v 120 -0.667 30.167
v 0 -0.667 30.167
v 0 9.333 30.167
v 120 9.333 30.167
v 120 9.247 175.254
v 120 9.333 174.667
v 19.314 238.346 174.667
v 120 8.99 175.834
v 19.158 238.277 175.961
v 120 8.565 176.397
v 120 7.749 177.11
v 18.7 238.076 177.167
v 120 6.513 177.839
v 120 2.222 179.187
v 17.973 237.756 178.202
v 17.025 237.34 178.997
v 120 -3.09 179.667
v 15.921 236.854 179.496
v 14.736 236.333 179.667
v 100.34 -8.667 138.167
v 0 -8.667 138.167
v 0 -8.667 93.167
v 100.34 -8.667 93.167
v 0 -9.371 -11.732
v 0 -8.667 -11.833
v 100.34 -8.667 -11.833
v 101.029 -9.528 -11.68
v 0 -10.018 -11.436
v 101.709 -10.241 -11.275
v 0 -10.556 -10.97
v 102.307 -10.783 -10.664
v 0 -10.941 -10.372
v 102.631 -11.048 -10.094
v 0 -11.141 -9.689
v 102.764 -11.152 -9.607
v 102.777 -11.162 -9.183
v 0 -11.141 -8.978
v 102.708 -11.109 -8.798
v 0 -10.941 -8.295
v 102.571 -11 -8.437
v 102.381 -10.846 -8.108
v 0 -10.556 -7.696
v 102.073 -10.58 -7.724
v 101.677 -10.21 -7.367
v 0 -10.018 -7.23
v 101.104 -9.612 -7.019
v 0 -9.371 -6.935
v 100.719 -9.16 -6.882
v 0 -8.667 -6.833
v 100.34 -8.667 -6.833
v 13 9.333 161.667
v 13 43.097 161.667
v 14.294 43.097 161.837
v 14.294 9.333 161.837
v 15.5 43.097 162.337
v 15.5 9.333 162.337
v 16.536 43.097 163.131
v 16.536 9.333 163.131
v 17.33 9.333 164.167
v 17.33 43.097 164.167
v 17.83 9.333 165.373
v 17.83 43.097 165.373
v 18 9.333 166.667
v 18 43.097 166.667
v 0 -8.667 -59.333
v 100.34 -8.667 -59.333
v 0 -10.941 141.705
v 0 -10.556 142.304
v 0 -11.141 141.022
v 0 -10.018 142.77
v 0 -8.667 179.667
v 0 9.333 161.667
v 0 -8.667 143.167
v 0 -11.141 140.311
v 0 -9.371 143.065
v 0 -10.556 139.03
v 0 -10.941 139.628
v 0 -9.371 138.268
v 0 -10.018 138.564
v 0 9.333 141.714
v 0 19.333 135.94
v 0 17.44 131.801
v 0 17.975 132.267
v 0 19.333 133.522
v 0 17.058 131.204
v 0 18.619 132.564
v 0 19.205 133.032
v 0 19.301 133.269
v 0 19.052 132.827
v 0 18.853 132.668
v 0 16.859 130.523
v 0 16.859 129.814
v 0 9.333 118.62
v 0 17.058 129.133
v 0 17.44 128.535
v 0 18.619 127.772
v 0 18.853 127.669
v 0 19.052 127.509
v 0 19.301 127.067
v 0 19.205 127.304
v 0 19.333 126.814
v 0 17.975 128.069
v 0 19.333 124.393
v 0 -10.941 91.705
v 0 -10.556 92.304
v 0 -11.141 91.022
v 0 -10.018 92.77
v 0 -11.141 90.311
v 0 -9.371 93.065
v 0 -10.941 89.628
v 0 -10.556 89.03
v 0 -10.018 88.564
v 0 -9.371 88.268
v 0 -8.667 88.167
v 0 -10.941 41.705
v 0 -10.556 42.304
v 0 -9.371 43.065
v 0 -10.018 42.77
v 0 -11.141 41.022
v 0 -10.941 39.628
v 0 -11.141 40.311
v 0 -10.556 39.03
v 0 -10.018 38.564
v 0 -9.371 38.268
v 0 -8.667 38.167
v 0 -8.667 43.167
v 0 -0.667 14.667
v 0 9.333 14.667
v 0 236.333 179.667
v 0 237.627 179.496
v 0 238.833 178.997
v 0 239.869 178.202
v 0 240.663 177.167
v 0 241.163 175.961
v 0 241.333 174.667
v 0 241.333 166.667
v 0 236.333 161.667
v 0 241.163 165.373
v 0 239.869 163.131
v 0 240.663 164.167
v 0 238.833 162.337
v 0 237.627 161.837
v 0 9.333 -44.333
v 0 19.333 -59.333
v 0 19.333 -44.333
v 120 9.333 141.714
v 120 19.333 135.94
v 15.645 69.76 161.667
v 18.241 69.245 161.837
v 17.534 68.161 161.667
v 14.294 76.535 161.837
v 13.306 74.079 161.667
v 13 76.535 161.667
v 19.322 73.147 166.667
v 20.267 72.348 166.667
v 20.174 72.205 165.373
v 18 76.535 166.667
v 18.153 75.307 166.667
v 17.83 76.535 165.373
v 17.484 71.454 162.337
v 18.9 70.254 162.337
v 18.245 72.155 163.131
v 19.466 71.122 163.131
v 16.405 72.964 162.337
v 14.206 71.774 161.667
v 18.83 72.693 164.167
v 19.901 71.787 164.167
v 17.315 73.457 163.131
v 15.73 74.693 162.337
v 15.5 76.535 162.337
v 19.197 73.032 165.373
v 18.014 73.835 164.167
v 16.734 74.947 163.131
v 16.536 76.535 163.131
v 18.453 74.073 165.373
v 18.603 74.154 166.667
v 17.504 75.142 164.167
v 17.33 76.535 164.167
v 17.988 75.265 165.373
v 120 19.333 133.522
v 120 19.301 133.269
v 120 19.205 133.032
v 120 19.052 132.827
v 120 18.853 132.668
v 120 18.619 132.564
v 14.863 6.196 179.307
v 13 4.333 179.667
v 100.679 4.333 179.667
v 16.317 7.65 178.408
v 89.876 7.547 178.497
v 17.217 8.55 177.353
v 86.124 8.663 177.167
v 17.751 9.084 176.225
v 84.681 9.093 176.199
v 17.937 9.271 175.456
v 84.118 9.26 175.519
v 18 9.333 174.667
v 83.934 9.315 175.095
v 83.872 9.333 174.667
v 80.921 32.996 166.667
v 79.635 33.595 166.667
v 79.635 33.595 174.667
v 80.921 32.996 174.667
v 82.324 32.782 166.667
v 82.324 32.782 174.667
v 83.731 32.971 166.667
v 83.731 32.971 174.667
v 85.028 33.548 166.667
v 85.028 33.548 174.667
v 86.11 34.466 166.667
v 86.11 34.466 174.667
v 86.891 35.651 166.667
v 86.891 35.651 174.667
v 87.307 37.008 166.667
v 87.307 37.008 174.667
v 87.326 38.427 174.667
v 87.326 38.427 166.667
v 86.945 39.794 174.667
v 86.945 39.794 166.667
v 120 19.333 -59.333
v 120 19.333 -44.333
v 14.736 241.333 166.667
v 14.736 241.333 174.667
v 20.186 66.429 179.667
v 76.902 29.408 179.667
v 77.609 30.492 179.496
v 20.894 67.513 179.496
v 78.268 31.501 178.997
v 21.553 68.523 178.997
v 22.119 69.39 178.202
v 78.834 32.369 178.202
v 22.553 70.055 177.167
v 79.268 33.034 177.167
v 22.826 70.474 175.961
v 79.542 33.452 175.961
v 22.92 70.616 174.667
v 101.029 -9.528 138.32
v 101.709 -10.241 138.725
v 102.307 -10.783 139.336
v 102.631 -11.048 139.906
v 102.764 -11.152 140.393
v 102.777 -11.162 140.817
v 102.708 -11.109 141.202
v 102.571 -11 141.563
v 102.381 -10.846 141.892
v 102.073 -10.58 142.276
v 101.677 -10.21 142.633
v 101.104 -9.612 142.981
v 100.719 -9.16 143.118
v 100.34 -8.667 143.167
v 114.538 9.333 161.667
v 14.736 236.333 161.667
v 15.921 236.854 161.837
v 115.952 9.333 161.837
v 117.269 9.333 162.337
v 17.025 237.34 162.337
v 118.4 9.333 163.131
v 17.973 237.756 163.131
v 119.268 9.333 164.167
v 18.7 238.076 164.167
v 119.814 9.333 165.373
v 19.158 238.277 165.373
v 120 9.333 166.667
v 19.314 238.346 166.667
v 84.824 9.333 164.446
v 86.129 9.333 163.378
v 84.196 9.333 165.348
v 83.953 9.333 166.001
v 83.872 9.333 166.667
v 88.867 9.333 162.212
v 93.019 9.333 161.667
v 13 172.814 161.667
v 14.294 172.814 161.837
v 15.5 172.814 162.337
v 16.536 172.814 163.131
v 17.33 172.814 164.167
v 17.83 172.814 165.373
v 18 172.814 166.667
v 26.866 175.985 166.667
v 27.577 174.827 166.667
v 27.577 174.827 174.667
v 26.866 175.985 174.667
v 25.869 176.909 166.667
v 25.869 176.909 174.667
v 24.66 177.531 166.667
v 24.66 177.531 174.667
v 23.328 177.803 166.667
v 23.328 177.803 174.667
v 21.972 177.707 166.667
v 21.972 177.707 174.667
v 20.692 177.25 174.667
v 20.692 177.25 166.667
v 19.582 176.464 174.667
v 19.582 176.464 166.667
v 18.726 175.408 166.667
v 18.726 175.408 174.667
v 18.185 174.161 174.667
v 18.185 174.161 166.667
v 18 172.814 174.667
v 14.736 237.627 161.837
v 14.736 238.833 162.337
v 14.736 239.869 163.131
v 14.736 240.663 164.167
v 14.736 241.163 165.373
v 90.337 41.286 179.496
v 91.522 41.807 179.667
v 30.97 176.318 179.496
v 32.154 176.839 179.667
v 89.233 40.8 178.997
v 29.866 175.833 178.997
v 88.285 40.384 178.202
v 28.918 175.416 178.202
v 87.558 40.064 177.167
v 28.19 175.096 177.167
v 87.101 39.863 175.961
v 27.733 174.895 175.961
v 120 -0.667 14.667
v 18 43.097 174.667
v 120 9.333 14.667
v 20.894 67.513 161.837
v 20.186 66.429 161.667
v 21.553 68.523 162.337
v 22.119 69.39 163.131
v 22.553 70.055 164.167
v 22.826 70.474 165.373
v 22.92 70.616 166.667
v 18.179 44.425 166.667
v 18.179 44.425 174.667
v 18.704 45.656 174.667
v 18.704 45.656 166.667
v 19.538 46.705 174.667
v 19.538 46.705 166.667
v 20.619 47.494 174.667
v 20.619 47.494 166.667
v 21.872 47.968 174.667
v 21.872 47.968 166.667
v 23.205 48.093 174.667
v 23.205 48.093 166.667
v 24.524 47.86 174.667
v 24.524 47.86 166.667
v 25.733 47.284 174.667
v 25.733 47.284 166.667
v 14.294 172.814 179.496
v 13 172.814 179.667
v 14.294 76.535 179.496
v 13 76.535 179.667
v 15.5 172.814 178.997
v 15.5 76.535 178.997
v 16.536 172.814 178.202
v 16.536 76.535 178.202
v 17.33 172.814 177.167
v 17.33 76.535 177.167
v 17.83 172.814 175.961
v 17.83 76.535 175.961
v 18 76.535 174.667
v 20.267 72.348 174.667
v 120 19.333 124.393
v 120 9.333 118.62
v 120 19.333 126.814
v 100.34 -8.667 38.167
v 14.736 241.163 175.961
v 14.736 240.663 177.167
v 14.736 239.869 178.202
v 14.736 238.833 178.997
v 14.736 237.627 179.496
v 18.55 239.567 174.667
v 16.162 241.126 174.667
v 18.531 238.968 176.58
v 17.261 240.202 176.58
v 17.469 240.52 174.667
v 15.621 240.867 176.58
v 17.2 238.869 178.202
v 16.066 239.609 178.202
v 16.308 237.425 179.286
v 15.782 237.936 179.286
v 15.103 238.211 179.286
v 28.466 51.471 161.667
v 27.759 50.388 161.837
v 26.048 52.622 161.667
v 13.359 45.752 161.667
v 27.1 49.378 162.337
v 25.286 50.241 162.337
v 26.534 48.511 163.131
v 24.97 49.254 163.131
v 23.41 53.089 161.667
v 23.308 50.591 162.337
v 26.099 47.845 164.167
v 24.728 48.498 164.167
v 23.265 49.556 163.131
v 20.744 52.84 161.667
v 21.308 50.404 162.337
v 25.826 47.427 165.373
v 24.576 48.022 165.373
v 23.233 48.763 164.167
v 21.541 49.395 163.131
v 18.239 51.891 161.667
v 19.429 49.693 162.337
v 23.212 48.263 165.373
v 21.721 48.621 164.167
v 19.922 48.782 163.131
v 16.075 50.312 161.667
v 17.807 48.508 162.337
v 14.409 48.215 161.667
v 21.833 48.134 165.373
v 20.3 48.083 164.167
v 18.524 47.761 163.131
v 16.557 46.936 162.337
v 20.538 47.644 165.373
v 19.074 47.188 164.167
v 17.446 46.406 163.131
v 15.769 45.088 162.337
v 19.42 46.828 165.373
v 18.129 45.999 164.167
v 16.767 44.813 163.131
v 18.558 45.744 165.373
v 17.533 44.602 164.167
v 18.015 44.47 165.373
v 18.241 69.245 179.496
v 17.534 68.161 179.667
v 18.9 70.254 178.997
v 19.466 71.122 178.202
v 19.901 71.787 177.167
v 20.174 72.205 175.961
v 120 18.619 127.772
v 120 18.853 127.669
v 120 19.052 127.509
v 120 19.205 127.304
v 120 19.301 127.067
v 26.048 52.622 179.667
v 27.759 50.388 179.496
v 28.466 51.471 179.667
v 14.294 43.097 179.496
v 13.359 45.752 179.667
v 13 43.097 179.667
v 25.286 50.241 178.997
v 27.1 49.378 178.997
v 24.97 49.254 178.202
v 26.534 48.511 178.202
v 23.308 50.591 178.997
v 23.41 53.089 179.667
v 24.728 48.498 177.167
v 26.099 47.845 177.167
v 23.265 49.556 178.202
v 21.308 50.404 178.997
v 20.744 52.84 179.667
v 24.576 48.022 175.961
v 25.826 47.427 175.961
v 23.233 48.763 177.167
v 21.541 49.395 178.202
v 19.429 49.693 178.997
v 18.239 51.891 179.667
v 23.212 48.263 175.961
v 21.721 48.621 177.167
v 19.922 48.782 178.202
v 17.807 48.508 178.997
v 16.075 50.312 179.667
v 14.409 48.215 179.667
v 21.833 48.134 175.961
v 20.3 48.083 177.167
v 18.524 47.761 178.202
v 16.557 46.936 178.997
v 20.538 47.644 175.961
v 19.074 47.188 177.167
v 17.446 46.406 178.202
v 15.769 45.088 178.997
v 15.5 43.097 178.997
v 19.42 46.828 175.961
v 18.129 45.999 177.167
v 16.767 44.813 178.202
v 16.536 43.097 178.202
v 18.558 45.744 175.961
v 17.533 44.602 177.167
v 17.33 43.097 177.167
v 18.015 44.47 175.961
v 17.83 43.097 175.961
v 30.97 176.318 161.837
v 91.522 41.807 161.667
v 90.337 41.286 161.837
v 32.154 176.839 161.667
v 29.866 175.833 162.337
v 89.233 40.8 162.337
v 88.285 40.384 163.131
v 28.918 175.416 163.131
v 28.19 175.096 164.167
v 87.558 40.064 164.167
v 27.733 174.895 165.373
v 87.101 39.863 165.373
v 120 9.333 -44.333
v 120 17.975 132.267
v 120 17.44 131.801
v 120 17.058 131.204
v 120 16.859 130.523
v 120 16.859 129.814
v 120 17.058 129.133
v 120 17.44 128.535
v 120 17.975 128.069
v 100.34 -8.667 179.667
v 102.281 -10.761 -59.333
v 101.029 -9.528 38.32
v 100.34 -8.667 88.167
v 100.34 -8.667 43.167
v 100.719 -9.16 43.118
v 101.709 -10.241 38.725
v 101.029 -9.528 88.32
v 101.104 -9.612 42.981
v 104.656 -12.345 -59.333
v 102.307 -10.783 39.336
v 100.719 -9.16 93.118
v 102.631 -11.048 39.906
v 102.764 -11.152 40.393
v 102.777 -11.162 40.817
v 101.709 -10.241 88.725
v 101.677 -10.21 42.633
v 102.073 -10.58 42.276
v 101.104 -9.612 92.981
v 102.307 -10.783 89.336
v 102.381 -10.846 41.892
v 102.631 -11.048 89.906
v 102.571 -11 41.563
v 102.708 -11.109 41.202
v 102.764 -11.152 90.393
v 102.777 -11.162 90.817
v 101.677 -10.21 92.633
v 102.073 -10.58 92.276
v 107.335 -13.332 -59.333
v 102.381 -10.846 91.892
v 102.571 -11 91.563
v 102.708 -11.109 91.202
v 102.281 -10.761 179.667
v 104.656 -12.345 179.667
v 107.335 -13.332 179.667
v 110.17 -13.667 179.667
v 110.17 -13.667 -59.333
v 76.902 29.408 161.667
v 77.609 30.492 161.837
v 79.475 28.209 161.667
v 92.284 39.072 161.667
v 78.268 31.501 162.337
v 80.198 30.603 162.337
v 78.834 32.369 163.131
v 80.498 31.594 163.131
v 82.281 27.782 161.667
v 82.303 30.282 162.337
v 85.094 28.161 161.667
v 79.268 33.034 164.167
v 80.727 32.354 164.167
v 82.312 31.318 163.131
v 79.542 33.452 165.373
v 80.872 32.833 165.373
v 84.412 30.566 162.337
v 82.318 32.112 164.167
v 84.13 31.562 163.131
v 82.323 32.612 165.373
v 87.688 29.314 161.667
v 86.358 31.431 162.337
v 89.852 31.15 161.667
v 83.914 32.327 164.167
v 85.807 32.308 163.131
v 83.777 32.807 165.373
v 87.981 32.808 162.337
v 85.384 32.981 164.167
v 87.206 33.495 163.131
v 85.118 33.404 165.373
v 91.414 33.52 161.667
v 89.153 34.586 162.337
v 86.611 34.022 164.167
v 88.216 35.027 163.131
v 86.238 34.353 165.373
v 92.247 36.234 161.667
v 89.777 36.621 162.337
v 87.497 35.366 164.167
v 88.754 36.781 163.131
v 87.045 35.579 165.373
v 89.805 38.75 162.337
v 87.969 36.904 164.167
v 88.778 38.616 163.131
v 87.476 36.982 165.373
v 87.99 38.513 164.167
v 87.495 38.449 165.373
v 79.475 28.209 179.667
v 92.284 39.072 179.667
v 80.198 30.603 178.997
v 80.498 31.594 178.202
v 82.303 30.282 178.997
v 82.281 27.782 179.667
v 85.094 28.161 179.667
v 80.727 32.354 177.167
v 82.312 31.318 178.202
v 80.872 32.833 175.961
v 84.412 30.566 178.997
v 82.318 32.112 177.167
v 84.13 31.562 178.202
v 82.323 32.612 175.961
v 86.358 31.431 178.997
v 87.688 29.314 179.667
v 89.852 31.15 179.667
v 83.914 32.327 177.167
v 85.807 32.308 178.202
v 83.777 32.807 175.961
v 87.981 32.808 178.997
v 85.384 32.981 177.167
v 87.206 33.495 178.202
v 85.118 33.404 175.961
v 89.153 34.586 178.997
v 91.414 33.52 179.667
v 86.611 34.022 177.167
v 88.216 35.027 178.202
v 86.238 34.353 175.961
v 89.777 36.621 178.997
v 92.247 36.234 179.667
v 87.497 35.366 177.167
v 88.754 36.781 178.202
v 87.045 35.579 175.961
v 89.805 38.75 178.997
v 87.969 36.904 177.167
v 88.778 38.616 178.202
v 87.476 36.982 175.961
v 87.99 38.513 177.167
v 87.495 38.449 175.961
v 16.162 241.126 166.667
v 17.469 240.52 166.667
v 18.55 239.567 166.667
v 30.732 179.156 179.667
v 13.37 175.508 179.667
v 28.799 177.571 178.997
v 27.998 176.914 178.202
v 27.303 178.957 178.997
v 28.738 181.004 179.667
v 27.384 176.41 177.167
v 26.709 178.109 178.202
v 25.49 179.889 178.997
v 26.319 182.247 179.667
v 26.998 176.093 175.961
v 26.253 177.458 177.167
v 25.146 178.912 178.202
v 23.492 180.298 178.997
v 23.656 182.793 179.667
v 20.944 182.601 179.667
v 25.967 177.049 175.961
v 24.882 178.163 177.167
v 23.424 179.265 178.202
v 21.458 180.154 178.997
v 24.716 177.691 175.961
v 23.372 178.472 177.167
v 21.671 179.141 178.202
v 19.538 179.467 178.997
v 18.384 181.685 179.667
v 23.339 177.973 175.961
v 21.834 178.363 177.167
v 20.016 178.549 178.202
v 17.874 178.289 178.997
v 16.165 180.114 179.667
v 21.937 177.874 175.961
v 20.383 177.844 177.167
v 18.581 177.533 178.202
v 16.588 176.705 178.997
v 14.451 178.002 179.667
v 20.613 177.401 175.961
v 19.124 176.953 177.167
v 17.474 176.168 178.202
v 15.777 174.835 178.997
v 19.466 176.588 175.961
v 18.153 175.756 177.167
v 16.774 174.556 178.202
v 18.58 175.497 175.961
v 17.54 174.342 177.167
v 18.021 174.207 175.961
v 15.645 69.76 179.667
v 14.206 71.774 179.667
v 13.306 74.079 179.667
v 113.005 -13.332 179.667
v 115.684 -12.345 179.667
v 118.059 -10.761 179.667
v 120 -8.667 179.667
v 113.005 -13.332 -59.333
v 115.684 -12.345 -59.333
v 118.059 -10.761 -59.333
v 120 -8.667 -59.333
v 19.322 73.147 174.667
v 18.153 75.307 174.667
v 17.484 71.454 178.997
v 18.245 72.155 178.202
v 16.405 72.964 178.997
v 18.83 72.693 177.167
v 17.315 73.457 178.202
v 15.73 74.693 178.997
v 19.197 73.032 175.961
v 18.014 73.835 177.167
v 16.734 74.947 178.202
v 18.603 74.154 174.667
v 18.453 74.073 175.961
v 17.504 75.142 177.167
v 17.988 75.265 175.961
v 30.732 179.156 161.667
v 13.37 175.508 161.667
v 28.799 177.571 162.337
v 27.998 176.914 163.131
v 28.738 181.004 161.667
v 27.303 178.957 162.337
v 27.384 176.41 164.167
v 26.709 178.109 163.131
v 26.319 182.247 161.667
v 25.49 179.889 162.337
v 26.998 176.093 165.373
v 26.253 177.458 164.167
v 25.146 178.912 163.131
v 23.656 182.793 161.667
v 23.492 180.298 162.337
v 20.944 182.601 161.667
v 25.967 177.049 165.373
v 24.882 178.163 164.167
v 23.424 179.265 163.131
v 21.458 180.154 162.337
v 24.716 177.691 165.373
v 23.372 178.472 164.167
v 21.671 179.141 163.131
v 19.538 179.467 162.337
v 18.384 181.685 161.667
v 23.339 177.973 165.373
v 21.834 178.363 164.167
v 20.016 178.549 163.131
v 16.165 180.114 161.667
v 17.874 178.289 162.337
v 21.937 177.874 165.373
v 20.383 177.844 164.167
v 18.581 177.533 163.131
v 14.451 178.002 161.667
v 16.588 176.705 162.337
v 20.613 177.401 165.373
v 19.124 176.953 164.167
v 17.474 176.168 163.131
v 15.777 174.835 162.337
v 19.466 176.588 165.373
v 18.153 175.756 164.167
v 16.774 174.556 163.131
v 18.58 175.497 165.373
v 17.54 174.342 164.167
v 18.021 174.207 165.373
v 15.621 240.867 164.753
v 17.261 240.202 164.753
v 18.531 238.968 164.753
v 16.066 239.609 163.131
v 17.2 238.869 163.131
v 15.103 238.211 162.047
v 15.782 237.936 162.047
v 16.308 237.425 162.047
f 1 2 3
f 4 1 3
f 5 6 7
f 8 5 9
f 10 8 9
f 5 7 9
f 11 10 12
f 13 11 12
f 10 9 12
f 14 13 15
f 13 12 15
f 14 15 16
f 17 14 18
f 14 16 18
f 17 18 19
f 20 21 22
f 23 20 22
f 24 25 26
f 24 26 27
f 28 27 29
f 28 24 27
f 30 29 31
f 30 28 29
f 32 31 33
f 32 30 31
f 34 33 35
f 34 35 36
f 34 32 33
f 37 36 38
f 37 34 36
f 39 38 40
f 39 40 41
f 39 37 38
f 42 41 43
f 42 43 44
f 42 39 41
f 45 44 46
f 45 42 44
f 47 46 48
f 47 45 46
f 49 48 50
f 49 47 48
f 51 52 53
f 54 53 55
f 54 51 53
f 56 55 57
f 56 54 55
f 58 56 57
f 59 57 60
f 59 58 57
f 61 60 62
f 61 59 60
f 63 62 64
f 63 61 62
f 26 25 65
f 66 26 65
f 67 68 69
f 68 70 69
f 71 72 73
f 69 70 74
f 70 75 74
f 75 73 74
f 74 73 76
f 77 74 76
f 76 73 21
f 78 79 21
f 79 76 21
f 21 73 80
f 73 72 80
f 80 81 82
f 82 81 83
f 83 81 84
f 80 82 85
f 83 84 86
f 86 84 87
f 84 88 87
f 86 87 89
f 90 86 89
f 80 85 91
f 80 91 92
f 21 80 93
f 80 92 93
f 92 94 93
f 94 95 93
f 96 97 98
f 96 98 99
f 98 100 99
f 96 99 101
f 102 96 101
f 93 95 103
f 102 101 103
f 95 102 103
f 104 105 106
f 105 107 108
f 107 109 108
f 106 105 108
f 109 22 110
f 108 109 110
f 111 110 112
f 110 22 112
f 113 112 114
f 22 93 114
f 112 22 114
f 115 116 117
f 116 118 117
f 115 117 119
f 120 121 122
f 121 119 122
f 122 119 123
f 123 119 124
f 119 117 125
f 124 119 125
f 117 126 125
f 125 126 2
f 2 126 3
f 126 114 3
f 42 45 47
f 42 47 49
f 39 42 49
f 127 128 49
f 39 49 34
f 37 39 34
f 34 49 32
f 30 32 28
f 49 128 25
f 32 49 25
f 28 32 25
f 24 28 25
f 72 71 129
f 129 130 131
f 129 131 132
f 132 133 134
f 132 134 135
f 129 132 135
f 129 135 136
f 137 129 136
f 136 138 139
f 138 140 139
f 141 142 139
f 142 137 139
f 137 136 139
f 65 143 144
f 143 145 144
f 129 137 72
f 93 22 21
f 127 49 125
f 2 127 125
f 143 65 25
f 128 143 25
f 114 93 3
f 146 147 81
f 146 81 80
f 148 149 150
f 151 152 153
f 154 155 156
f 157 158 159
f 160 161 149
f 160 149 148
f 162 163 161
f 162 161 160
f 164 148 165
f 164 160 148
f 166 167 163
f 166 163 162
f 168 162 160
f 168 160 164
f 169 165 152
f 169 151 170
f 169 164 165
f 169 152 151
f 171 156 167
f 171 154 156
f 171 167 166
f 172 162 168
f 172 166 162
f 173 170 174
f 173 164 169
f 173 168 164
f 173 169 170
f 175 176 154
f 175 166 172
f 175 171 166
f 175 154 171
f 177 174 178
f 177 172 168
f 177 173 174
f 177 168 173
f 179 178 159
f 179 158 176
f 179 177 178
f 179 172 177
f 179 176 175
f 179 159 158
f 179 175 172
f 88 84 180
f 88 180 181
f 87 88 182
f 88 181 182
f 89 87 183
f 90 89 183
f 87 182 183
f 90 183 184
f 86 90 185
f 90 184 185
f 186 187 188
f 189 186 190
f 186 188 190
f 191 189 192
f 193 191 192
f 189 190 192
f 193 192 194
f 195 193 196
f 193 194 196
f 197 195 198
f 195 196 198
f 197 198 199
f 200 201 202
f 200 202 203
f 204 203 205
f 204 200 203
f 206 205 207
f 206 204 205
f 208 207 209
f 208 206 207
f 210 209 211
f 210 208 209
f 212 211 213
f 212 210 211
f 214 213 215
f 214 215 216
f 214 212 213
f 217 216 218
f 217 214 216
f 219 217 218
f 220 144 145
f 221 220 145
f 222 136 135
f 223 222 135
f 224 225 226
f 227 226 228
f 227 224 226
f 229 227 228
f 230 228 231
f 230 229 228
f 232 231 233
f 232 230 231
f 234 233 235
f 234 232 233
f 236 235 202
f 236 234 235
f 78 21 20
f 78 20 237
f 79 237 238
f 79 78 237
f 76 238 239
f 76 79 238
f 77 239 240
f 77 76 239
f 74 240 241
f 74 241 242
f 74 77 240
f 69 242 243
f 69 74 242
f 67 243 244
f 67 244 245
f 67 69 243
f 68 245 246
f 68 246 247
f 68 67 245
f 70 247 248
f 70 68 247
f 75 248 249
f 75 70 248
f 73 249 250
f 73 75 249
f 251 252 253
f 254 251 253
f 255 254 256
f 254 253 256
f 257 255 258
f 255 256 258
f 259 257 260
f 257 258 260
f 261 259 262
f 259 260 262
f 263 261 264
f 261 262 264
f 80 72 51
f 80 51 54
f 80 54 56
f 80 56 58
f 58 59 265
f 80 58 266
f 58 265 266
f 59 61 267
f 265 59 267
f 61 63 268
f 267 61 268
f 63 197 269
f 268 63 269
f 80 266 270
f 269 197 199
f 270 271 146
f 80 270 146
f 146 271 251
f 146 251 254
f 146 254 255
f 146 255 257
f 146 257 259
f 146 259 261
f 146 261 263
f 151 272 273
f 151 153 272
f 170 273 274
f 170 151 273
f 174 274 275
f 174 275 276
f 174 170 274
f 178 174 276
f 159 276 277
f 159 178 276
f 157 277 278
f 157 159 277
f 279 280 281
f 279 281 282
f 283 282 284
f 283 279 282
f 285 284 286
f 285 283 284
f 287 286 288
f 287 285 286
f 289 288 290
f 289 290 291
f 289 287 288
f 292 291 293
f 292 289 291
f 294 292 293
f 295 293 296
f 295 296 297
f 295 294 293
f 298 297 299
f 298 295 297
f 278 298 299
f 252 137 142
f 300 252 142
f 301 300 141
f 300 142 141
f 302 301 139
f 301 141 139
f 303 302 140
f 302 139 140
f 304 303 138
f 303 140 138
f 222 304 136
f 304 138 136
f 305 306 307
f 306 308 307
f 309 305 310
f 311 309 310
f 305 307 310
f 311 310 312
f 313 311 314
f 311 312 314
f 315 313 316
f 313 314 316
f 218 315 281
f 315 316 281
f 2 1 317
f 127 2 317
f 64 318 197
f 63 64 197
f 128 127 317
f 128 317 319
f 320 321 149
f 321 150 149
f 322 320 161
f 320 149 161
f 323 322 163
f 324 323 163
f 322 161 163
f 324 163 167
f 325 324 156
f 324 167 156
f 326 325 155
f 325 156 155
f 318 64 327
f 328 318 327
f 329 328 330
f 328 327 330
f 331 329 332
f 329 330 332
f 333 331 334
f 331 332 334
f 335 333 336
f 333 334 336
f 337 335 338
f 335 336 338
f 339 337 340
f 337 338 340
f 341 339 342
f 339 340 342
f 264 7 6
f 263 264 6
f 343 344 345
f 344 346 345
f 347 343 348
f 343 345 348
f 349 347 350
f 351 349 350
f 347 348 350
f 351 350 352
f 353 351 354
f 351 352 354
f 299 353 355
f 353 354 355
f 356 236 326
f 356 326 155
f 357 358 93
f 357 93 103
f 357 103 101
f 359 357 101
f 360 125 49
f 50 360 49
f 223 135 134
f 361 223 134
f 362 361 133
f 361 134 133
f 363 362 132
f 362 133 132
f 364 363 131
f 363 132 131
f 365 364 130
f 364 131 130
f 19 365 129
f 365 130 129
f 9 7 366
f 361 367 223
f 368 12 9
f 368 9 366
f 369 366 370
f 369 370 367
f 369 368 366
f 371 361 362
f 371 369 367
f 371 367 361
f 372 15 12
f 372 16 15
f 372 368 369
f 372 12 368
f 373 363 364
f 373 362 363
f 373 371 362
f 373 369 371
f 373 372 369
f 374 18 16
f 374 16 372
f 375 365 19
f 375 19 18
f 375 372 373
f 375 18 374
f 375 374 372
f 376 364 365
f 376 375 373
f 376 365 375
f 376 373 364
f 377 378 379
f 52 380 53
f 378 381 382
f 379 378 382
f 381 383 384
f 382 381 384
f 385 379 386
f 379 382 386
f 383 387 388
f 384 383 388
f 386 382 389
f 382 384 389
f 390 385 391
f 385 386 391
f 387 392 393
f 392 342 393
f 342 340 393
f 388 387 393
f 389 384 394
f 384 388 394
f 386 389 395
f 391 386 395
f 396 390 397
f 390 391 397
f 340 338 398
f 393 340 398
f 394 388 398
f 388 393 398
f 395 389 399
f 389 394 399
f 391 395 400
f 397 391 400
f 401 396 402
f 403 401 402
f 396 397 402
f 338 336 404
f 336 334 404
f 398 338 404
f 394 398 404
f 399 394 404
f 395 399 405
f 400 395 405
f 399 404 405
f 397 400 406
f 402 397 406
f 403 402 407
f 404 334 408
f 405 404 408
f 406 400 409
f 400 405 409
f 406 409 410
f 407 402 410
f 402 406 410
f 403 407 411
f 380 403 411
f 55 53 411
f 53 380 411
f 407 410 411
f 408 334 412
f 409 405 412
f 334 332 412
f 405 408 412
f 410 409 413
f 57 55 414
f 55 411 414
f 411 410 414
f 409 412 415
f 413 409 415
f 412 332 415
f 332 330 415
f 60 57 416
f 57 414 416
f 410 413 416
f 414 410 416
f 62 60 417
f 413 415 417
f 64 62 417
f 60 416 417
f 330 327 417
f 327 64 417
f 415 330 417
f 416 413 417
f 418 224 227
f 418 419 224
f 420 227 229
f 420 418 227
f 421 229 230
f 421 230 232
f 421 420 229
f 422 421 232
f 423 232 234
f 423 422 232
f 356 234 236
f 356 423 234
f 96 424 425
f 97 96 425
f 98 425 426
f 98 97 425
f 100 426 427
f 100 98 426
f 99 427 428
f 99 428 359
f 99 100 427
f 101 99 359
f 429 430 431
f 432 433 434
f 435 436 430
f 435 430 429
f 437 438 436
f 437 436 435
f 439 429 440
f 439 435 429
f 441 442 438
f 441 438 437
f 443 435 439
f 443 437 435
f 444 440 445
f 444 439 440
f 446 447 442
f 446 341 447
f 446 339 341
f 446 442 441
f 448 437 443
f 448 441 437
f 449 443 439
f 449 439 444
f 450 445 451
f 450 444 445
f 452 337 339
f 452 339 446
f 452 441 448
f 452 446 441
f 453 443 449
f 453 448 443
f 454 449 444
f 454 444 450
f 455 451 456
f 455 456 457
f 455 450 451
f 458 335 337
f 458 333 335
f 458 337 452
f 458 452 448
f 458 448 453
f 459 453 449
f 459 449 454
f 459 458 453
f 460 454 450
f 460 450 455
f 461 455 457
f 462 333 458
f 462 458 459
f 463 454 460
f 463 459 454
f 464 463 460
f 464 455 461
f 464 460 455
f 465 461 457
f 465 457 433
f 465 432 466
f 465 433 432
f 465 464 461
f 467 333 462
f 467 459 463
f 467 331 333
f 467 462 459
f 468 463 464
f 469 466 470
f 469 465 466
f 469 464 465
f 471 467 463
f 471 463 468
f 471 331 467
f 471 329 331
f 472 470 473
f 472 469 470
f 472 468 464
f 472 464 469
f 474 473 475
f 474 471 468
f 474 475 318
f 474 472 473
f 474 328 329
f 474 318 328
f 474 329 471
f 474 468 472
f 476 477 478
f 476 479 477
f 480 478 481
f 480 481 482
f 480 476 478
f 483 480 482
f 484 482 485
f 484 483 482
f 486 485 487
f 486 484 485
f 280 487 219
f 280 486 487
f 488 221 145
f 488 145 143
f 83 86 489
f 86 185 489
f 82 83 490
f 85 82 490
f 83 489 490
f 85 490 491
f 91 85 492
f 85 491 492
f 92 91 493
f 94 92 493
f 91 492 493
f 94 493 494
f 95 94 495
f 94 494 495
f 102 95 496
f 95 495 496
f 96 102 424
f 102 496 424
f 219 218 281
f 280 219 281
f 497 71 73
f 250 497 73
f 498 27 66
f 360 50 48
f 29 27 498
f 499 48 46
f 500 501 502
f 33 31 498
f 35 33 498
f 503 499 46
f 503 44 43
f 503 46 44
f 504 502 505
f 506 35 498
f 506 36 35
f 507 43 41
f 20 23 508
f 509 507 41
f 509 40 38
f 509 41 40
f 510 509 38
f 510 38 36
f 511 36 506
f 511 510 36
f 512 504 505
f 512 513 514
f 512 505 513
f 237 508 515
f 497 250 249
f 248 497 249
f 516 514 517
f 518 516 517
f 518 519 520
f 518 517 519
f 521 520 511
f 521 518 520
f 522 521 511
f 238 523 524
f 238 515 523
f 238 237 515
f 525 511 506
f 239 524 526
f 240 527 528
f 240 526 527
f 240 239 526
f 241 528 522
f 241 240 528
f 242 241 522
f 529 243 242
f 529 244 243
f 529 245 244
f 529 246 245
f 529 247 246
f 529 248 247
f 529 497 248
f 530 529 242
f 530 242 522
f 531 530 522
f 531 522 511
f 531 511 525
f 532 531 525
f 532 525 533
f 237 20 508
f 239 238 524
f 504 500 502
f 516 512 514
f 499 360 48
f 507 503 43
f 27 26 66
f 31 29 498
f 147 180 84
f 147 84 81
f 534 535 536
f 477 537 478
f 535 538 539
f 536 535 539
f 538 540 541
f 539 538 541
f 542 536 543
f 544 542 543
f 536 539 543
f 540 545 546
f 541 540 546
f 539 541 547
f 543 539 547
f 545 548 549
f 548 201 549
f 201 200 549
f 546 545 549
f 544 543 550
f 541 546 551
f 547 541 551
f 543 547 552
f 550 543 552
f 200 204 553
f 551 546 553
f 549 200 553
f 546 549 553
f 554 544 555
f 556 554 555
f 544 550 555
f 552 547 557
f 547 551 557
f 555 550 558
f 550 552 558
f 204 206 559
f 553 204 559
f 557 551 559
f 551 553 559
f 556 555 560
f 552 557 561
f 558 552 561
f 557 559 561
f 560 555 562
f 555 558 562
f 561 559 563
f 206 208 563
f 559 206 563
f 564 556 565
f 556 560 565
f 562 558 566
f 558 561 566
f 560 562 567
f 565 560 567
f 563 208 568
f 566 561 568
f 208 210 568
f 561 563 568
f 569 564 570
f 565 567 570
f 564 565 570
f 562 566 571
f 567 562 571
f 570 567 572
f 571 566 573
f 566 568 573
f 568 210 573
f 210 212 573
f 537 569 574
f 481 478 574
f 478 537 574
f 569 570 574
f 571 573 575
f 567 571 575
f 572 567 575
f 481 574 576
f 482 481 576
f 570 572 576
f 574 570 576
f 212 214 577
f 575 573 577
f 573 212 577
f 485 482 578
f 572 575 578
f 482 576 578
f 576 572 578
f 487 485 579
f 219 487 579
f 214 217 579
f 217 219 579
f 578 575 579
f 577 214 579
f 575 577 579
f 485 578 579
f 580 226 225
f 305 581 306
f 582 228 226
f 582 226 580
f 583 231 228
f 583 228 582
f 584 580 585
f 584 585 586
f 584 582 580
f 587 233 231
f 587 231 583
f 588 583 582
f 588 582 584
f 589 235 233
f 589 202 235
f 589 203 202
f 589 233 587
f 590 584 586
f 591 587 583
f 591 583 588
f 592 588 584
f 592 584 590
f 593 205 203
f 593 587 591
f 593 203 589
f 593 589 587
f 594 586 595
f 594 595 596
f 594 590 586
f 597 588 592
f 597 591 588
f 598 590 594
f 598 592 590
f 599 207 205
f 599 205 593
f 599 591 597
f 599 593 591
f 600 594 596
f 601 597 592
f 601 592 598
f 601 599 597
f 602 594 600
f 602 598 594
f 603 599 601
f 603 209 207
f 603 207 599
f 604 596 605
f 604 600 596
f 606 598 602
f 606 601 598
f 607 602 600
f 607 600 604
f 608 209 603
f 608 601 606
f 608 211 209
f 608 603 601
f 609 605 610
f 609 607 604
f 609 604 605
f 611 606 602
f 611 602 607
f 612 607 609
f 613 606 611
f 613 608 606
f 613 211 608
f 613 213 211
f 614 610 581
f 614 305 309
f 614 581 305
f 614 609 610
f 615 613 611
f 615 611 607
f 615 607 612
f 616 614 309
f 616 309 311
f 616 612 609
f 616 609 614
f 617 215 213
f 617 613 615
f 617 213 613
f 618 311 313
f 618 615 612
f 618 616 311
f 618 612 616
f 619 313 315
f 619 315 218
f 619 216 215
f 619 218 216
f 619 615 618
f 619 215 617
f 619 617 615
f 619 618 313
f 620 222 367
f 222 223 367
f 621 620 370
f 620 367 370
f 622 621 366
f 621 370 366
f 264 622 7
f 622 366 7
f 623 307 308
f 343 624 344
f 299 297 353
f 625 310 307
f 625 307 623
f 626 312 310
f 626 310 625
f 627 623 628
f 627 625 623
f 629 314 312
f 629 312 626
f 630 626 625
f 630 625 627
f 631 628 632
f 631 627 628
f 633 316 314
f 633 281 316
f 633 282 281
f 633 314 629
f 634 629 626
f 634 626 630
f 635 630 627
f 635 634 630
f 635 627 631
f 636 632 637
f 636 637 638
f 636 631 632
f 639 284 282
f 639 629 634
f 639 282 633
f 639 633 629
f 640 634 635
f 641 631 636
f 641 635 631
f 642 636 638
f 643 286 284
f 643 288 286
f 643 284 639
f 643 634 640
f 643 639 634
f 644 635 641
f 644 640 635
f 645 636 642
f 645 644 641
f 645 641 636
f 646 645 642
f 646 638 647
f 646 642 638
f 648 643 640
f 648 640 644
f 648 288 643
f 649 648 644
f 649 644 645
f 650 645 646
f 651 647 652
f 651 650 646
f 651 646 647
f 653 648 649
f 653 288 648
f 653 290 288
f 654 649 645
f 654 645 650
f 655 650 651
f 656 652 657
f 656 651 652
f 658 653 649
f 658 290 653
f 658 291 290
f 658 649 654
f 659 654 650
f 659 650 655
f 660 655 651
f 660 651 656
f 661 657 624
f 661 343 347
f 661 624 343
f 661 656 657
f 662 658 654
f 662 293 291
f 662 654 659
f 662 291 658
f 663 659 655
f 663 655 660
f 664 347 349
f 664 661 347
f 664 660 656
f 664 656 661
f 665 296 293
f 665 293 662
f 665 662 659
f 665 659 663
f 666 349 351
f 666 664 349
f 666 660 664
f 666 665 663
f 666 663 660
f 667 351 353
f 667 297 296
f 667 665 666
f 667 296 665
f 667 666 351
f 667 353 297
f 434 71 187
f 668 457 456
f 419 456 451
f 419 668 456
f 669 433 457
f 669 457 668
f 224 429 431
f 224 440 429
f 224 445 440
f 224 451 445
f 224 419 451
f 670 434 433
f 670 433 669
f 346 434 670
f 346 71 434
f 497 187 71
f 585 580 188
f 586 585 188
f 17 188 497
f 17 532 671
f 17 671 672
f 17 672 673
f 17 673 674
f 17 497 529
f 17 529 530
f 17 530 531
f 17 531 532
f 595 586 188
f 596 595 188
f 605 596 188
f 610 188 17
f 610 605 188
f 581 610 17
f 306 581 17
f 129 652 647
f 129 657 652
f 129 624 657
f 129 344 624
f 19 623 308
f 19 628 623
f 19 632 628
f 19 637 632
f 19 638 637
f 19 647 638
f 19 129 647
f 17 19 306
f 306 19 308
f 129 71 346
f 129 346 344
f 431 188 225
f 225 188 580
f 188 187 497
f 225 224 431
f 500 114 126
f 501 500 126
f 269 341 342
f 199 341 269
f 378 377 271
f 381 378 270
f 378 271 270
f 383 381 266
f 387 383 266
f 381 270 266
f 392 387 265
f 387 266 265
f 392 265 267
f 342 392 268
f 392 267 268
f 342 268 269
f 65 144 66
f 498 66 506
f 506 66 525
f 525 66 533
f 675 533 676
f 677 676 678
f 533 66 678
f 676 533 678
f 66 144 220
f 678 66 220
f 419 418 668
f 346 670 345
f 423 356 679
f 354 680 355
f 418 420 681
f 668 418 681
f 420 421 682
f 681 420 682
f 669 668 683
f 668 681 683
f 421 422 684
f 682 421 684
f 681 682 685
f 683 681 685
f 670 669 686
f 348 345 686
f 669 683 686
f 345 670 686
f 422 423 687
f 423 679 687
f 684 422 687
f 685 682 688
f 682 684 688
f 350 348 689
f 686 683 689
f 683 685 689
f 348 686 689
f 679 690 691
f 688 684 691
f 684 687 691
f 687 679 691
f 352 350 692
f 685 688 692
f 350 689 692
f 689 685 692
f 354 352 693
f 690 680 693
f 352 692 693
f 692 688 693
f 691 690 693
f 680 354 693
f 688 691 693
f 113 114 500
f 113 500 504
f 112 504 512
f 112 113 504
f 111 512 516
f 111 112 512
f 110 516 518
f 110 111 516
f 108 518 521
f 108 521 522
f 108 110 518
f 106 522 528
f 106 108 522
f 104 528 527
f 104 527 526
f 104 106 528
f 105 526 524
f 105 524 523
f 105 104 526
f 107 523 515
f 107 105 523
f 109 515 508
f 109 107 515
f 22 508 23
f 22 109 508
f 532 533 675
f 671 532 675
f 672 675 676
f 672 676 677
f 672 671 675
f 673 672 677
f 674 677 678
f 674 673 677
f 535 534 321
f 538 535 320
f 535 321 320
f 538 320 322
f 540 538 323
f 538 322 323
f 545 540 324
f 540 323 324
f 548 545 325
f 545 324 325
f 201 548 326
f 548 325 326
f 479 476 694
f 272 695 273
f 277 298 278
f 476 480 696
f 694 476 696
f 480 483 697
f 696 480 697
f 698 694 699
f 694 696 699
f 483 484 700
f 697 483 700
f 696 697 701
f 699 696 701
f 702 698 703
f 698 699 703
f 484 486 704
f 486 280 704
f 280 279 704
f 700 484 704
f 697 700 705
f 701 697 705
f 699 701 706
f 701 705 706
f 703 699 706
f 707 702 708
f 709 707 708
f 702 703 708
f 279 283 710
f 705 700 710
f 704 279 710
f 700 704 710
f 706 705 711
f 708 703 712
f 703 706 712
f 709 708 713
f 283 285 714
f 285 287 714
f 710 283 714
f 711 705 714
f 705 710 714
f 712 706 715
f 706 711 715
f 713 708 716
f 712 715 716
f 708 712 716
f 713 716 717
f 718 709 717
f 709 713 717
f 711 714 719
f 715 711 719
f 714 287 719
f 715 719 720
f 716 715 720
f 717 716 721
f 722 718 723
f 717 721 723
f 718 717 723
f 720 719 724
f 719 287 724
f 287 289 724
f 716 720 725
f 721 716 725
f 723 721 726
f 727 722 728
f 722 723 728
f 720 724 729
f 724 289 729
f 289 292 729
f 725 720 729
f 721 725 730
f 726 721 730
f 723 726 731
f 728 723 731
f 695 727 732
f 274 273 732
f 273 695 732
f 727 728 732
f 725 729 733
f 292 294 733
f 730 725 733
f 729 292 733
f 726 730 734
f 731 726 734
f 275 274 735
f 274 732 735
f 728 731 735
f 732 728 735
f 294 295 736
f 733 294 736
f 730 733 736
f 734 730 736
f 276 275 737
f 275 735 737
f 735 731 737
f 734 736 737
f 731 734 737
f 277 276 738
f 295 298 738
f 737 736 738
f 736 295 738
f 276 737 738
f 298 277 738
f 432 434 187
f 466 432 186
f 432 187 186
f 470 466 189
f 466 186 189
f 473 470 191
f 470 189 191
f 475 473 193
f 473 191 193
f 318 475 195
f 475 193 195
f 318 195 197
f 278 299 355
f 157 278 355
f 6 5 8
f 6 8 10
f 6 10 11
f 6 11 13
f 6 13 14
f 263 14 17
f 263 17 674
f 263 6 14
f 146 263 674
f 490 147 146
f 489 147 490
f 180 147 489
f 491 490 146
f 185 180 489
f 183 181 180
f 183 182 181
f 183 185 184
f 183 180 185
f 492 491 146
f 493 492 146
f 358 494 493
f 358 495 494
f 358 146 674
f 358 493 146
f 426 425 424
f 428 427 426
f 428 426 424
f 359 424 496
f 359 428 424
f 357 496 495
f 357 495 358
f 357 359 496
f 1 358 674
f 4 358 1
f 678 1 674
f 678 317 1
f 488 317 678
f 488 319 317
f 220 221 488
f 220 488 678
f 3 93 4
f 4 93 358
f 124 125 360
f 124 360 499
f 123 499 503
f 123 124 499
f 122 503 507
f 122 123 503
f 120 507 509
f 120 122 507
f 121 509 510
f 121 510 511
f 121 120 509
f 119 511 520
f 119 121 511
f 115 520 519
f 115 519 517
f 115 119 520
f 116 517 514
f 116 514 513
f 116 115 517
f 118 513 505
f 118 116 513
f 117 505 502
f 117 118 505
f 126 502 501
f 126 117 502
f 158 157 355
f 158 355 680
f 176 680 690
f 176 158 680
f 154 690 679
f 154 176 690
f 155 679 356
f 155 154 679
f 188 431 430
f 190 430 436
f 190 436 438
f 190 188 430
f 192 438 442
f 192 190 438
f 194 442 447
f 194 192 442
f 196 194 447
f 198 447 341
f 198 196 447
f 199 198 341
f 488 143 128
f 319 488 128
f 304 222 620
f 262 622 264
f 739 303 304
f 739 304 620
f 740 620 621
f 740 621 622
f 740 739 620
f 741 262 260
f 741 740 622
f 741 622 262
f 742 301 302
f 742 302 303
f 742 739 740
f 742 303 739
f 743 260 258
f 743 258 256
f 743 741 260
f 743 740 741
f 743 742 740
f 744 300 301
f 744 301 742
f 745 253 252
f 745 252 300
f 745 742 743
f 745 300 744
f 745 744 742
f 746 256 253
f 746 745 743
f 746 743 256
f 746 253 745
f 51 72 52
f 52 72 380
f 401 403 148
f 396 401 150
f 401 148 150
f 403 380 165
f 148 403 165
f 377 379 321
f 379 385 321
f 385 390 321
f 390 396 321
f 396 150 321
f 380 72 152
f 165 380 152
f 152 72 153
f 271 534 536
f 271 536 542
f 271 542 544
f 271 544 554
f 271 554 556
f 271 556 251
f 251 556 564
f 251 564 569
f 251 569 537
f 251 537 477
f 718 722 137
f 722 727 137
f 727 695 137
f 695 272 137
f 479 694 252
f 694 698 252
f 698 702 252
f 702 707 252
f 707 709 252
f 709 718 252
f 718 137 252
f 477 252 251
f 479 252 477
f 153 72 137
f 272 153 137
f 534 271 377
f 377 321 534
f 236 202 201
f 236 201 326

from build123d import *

# Parameters (mm, degrees)
EXTRUDE_1_DEPTH     = 120
SKETCH_2_W          = 15.5
SKETCH_2_H          = 10
CUT_EXTRUDE_1_DEPTH = 324.916484435
CUT_EXTRUDE_2_DEPTH = 40
CUT_EXTRUDE_3_DEPTH = 40
FILLET_16_R         = 5
EXTRUDE_2_DEPTH     = 239
EXTRUDE_3_DEPTH     = 18
FILLET_17_R         = 5
EXTRUDE_4_DEPTH     = 120
SKETCH_11_R         = 2.5
EXTRUDE_5_DEPTH     = 110
SKETCH_12_R         = 2.5
CUT_EXTRUDE_4_DEPTH = 324.916484528
FILLET_19_R         = 1


with BuildPart() as part:
    # 草圖1 → 填料-伸長1 (new body)
    with BuildSketch(Plane(origin=(0, 0, 0), x_dir=(0, 0, -1), z_dir=(1, 0, 0))):
        Polygon((-179.666666667, 241.333333333), (-179.666666667, -8.666666667), (59.333333333, -8.666666667), (59.333333333, 9.333333333), (59.333333333, 19.333333333), (44.333333333, 19.333333333), (44.333333333, 9.333333333), (-161.666666667, 9.333333333), (-161.666666667, 241.333333333), align=None)
    extrude(amount=EXTRUDE_1_DEPTH)

    # 草圖2 → 除料-伸長1 (cut, through all)
    with BuildSketch(Plane(origin=(120, 0, 0), x_dir=(0, 0, -1), z_dir=(1, 0, 0))):
        with Locations((-22.416666667, 4.333333333)):
            Rectangle(SKETCH_2_W, SKETCH_2_H)
    extrude(amount=-CUT_EXTRUDE_1_DEPTH, mode=Mode.SUBTRACT)

    # 草圖4 → 除料-伸長2 (cut)
    with BuildSketch(Plane.XY.offset(179.666666667)):
        Polygon((120, 241.333333333), (18, 241.333333333), (120, 9.333333333), align=None)
    extrude(amount=-CUT_EXTRUDE_2_DEPTH, mode=Mode.SUBTRACT)

    # 草圖5 → 除料-伸長3 (cut)
    with BuildSketch(Plane.XY.offset(179.666666667)):
        Polygon((100.337138528, 9.333333333), (18, 196.609962141), (18, 9.333333333), align=None)
    extrude(amount=-CUT_EXTRUDE_3_DEPTH, mode=Mode.SUBTRACT)

    # 圓角16
    # the kernel refuses this fillet: 5 mm, written as the material it takes off along each edge
    with BuildSketch(Plane(origin=(14.736369898, 236.333333333, 166.666666667), x_dir=(0, 1, 0), z_dir=(0, 0, -1))) as fillet_16_piece_1_section:
        Polygon((0, 0), (FILLET_16_R, 0), (FILLET_16_R, FILLET_16_R * 0.652726020499), (FILLET_16_R * 0.402474131984, FILLET_16_R * 0.915431359023), align=None)
    fillet_16_piece_1 = extrude(amount=FILLET_16_R, mode=Mode.PRIVATE)
    fillet_16_piece_1 = fillet_16_piece_1 - Plane(origin=(14.736369898, 236.333333333, 166.666666667), x_dir=(-0.5465921093537591, -0.8373989885306815, 0), z_dir=(0, 0, -1)) * Sphere(FILLET_16_R, mode=Mode.PRIVATE)
    add(fillet_16_piece_1, mode=Mode.SUBTRACT)
    with BuildSketch(Plane(origin=(14.736369898, 236.333333333, 174.666666667), x_dir=(0, 1, 0), z_dir=(0, 0, 1))) as fillet_16_piece_2_section:
        Polygon((0, 0), (FILLET_16_R, 0), (FILLET_16_R, -FILLET_16_R * 0.652726020499), (FILLET_16_R * 0.402474131984, -FILLET_16_R * 0.915431359023), align=None)
    fillet_16_piece_2 = extrude(amount=FILLET_16_R, mode=Mode.PRIVATE)
    fillet_16_piece_2 = fillet_16_piece_2 - Plane(origin=(14.736369898, 236.333333333, 174.666666667), x_dir=(-0.5465921093537591, -0.8373989885306815, 0), z_dir=(0, 0, 1)) * Sphere(FILLET_16_R, mode=Mode.PRIVATE)
    add(fillet_16_piece_2, mode=Mode.SUBTRACT)
    with BuildSketch(Plane(origin=(-12.5, 241.333333333, 161.666666667), x_dir=(0, 0, 1), z_dir=(1, 0, 0)), Plane(origin=(-12.5, 241.333333333, 179.666666667), x_dir=(0, -1, 0), z_dir=(1, 0, 0))) as fillet_16_piece_3:
        with BuildLine():
            CenterArc((FILLET_16_R, FILLET_16_R), FILLET_16_R, 180, 90)
            Line((0, FILLET_16_R), (0, 0))
            Line((0, 0), (FILLET_16_R, 0))
        make_face()
    extrude(amount=27.236369898, mode=Mode.SUBTRACT)
    with BuildSketch(Plane(origin=(18, 241.333333333, 174.666666667), x_dir=(-1, 0, 0), z_dir=(0, 0, -1))) as fillet_16_piece_4:
        with BuildLine():
            CenterArc((FILLET_16_R * 0.652726020499, -FILLET_16_R), FILLET_16_R, 90, 66.267060196)
            Line((-FILLET_16_R * 0.262705338524, -FILLET_16_R * 0.597525868016), (0, 0))
            Line((0, 0), (FILLET_16_R * 0.652726020499, 0))
        make_face()
    extrude(amount=8, mode=Mode.SUBTRACT)
    with BuildSketch(Plane(origin=(19.313526693, 238.345703993, 161.666666667), x_dir=(0, 0, 1), z_dir=(0.40247413198441667, -0.9154313590233789, 0))) as fillet_16_piece_5_section:
        with BuildLine():
            CenterArc((FILLET_16_R, FILLET_16_R), FILLET_16_R, 180, 90)
            Line((0, FILLET_16_R), (0, 0))
            Line((0, 0), (FILLET_16_R, 0))
        make_face()
    fillet_16_piece_5 = extrude(amount=262.668806653, mode=Mode.PRIVATE)
    fillet_16_piece_5 = split(fillet_16_piece_5, bisect_by=Plane(origin=(68.522420019, 9.333333333, 162.799850977), z_dir=(0, 1, 0)), keep=Keep.TOP, mode=Mode.PRIVATE)
    add(fillet_16_piece_5, mode=Mode.SUBTRACT)
    with BuildSketch(Plane(origin=(19.313526693, 238.345703993, 179.666666667), x_dir=(-0.9154313590233789, -0.40247413198441667, 5.6843418860808026e-15), z_dir=(0.40247413198441667, -0.9154313590233789, 0))) as fillet_16_piece_6:
        with BuildLine():
            CenterArc((FILLET_16_R, FILLET_16_R), FILLET_16_R, 180, 90)
            Line((0, FILLET_16_R), (0, 0))
            Line((0, 0), (FILLET_16_R, 0))
        make_face()
    extrude(amount=262.668806653, mode=Mode.SUBTRACT)

    # 草圖8 → 填料-伸長2 (add)
    with BuildSketch(Plane.XY.offset(179.666666667)):
        with BuildLine():
            ThreePointArc((110.17, -13.666666712), (115.684274668, -12.344840676), (120, -8.666666667))
            Line((120, -8.666666667), (110.17, -8.666666667))
            Line((110.17, -8.666666667), (110.17, -13.666666667))
        make_face()
        with BuildLine():
            Line((110.17, -13.666666667), (110.17, -8.666666667))
            Line((110.17, -8.666666667), (100.34, -8.666666667))
            ThreePointArc((100.34, -8.666666667), (104.655725332, -12.344840676), (110.17, -13.666666712))
        make_face()
        with BuildLine():
            ThreePointArc((110.17, -13.666666712), (115.684274668, -12.344840676), (120, -8.666666667))
            Line((120, -8.666666667), (110.17, -8.666666667))
            Line((110.17, -8.666666667), (110.17, -13.666666667))
        make_face()
        with BuildLine():
            Line((110.17, -13.666666667), (110.17, -8.666666667))
            Line((110.17, -8.666666667), (100.34, -8.666666667))
            ThreePointArc((100.34, -8.666666667), (104.655725332, -12.344840676), (110.17, -13.666666712))
        make_face()
    extrude(amount=-EXTRUDE_2_DEPTH)

    # 草圖9 → 填料-伸長3 (add)
    with BuildSketch(Plane.XY.offset(179.666666667)):
        Polygon((18, 63.079938443), (100.337138528, 9.333333333), (93.709875708, 24.407107589), (22.919522331, 70.616403134), (18, 73.827683351), align=None)
        Polygon((18, 52.332193536), (83.872125352, 9.333333333), (100.337138528, 9.333333333), (18, 63.079938443), align=None)
        Polygon((100.337138528, 9.333333333), (83.872125352, 9.333333333), (95.417616197, 1.796868643), align=None)
        Polygon((93.711170014, 24.406262715), (100.337138528, 9.333333333), (105.256660859, 16.869798024), align=None)
        Polygon((10.463535309, 67.999460774), (18, 63.079938443), (18, 73.827683351), (15.38305764, 75.535925465), align=None)
        Polygon((13.080477669, 55.543473753), (18, 52.332193536), (18, 63.079938443), align=None)
    extrude(amount=-EXTRUDE_3_DEPTH)

    # 圓角17
    fillet_17_edges = [part.edges().sort_by_distance(p)[0] for p in [
        (93.709875708, 24.407107589, 170.666666667),
        (18, 30.832763435, 179.666666667),
        (18, 30.832763435, 161.666666667),
        (18, 52.332193536, 170.666666667),
        (50.936062676, 30.832763435, 161.666666667),
        (50.936062676, 30.832763435, 179.666666667),
        (18, 73.827683351, 170.666666667),
        (55.854937854, 49.11739547, 179.666666667),
        (55.854937854, 49.11739547, 161.666666667),
        (55.854937854, 110.508534865, 161.666666667),
        (18, 135.218822746, 161.666666667),
        (18, 196.609962141, 170.666666667),
        (55.854937854, 110.508534865, 179.666666667),
        (18, 135.218822746, 179.666666667),
        (50.936062676, 9.333333333, 179.666666667),
    ]]
    fillet(fillet_17_edges, radius=FILLET_17_R)

    # 草圖10 → 填料-伸長4 (add)
    with BuildSketch(Plane(origin=(120, 0, 0), x_dir=(0, 0, -1), z_dir=(1, 0, 0))):
        Polygon((-118.619661283, 9.333333333), (-124.393163975, 19.333333333), (-135.940169359, 19.333333333), (-141.71367205, 9.333333333), (-135.940169359, -0.666666667), (-124.393163975, -0.666666667), align=None)
    extrude(amount=-EXTRUDE_4_DEPTH)

    # 草圖11 → 填料-伸長5 (add)
    with BuildSketch(Plane.ZY):
        with Locations((140.666666667, -8.666666667)):
            Circle(SKETCH_11_R)
        with Locations((90.666666667, -8.666666667)):
            Circle(SKETCH_11_R)
        with Locations((40.666666667, -8.666666667)):
            Circle(SKETCH_11_R)
        with Locations((-9.333333333, -8.666666667)):
            Circle(SKETCH_11_R)
    extrude(amount=-EXTRUDE_5_DEPTH)

    # 草圖12 → 除料-伸長4 (cut, through all)
    with BuildSketch(Plane(origin=(120, 0, 0), x_dir=(0, 0, -1), z_dir=(1, 0, 0))):
        with Locations((-130.168163975, 19.333333333)):
            Circle(SKETCH_12_R)
    extrude(amount=-CUT_EXTRUDE_4_DEPTH, mode=Mode.SUBTRACT)

    # 圓角19
    fillet_19_edges = [part.edges().sort_by_distance(p)[0] for p in [
        (60, 19.333333333, 127.668163975),
        (60, 19.333333333, 132.668163975),
    ]]
    fillet(fillet_19_edges, radius=FILLET_19_R)


solid = part.part
